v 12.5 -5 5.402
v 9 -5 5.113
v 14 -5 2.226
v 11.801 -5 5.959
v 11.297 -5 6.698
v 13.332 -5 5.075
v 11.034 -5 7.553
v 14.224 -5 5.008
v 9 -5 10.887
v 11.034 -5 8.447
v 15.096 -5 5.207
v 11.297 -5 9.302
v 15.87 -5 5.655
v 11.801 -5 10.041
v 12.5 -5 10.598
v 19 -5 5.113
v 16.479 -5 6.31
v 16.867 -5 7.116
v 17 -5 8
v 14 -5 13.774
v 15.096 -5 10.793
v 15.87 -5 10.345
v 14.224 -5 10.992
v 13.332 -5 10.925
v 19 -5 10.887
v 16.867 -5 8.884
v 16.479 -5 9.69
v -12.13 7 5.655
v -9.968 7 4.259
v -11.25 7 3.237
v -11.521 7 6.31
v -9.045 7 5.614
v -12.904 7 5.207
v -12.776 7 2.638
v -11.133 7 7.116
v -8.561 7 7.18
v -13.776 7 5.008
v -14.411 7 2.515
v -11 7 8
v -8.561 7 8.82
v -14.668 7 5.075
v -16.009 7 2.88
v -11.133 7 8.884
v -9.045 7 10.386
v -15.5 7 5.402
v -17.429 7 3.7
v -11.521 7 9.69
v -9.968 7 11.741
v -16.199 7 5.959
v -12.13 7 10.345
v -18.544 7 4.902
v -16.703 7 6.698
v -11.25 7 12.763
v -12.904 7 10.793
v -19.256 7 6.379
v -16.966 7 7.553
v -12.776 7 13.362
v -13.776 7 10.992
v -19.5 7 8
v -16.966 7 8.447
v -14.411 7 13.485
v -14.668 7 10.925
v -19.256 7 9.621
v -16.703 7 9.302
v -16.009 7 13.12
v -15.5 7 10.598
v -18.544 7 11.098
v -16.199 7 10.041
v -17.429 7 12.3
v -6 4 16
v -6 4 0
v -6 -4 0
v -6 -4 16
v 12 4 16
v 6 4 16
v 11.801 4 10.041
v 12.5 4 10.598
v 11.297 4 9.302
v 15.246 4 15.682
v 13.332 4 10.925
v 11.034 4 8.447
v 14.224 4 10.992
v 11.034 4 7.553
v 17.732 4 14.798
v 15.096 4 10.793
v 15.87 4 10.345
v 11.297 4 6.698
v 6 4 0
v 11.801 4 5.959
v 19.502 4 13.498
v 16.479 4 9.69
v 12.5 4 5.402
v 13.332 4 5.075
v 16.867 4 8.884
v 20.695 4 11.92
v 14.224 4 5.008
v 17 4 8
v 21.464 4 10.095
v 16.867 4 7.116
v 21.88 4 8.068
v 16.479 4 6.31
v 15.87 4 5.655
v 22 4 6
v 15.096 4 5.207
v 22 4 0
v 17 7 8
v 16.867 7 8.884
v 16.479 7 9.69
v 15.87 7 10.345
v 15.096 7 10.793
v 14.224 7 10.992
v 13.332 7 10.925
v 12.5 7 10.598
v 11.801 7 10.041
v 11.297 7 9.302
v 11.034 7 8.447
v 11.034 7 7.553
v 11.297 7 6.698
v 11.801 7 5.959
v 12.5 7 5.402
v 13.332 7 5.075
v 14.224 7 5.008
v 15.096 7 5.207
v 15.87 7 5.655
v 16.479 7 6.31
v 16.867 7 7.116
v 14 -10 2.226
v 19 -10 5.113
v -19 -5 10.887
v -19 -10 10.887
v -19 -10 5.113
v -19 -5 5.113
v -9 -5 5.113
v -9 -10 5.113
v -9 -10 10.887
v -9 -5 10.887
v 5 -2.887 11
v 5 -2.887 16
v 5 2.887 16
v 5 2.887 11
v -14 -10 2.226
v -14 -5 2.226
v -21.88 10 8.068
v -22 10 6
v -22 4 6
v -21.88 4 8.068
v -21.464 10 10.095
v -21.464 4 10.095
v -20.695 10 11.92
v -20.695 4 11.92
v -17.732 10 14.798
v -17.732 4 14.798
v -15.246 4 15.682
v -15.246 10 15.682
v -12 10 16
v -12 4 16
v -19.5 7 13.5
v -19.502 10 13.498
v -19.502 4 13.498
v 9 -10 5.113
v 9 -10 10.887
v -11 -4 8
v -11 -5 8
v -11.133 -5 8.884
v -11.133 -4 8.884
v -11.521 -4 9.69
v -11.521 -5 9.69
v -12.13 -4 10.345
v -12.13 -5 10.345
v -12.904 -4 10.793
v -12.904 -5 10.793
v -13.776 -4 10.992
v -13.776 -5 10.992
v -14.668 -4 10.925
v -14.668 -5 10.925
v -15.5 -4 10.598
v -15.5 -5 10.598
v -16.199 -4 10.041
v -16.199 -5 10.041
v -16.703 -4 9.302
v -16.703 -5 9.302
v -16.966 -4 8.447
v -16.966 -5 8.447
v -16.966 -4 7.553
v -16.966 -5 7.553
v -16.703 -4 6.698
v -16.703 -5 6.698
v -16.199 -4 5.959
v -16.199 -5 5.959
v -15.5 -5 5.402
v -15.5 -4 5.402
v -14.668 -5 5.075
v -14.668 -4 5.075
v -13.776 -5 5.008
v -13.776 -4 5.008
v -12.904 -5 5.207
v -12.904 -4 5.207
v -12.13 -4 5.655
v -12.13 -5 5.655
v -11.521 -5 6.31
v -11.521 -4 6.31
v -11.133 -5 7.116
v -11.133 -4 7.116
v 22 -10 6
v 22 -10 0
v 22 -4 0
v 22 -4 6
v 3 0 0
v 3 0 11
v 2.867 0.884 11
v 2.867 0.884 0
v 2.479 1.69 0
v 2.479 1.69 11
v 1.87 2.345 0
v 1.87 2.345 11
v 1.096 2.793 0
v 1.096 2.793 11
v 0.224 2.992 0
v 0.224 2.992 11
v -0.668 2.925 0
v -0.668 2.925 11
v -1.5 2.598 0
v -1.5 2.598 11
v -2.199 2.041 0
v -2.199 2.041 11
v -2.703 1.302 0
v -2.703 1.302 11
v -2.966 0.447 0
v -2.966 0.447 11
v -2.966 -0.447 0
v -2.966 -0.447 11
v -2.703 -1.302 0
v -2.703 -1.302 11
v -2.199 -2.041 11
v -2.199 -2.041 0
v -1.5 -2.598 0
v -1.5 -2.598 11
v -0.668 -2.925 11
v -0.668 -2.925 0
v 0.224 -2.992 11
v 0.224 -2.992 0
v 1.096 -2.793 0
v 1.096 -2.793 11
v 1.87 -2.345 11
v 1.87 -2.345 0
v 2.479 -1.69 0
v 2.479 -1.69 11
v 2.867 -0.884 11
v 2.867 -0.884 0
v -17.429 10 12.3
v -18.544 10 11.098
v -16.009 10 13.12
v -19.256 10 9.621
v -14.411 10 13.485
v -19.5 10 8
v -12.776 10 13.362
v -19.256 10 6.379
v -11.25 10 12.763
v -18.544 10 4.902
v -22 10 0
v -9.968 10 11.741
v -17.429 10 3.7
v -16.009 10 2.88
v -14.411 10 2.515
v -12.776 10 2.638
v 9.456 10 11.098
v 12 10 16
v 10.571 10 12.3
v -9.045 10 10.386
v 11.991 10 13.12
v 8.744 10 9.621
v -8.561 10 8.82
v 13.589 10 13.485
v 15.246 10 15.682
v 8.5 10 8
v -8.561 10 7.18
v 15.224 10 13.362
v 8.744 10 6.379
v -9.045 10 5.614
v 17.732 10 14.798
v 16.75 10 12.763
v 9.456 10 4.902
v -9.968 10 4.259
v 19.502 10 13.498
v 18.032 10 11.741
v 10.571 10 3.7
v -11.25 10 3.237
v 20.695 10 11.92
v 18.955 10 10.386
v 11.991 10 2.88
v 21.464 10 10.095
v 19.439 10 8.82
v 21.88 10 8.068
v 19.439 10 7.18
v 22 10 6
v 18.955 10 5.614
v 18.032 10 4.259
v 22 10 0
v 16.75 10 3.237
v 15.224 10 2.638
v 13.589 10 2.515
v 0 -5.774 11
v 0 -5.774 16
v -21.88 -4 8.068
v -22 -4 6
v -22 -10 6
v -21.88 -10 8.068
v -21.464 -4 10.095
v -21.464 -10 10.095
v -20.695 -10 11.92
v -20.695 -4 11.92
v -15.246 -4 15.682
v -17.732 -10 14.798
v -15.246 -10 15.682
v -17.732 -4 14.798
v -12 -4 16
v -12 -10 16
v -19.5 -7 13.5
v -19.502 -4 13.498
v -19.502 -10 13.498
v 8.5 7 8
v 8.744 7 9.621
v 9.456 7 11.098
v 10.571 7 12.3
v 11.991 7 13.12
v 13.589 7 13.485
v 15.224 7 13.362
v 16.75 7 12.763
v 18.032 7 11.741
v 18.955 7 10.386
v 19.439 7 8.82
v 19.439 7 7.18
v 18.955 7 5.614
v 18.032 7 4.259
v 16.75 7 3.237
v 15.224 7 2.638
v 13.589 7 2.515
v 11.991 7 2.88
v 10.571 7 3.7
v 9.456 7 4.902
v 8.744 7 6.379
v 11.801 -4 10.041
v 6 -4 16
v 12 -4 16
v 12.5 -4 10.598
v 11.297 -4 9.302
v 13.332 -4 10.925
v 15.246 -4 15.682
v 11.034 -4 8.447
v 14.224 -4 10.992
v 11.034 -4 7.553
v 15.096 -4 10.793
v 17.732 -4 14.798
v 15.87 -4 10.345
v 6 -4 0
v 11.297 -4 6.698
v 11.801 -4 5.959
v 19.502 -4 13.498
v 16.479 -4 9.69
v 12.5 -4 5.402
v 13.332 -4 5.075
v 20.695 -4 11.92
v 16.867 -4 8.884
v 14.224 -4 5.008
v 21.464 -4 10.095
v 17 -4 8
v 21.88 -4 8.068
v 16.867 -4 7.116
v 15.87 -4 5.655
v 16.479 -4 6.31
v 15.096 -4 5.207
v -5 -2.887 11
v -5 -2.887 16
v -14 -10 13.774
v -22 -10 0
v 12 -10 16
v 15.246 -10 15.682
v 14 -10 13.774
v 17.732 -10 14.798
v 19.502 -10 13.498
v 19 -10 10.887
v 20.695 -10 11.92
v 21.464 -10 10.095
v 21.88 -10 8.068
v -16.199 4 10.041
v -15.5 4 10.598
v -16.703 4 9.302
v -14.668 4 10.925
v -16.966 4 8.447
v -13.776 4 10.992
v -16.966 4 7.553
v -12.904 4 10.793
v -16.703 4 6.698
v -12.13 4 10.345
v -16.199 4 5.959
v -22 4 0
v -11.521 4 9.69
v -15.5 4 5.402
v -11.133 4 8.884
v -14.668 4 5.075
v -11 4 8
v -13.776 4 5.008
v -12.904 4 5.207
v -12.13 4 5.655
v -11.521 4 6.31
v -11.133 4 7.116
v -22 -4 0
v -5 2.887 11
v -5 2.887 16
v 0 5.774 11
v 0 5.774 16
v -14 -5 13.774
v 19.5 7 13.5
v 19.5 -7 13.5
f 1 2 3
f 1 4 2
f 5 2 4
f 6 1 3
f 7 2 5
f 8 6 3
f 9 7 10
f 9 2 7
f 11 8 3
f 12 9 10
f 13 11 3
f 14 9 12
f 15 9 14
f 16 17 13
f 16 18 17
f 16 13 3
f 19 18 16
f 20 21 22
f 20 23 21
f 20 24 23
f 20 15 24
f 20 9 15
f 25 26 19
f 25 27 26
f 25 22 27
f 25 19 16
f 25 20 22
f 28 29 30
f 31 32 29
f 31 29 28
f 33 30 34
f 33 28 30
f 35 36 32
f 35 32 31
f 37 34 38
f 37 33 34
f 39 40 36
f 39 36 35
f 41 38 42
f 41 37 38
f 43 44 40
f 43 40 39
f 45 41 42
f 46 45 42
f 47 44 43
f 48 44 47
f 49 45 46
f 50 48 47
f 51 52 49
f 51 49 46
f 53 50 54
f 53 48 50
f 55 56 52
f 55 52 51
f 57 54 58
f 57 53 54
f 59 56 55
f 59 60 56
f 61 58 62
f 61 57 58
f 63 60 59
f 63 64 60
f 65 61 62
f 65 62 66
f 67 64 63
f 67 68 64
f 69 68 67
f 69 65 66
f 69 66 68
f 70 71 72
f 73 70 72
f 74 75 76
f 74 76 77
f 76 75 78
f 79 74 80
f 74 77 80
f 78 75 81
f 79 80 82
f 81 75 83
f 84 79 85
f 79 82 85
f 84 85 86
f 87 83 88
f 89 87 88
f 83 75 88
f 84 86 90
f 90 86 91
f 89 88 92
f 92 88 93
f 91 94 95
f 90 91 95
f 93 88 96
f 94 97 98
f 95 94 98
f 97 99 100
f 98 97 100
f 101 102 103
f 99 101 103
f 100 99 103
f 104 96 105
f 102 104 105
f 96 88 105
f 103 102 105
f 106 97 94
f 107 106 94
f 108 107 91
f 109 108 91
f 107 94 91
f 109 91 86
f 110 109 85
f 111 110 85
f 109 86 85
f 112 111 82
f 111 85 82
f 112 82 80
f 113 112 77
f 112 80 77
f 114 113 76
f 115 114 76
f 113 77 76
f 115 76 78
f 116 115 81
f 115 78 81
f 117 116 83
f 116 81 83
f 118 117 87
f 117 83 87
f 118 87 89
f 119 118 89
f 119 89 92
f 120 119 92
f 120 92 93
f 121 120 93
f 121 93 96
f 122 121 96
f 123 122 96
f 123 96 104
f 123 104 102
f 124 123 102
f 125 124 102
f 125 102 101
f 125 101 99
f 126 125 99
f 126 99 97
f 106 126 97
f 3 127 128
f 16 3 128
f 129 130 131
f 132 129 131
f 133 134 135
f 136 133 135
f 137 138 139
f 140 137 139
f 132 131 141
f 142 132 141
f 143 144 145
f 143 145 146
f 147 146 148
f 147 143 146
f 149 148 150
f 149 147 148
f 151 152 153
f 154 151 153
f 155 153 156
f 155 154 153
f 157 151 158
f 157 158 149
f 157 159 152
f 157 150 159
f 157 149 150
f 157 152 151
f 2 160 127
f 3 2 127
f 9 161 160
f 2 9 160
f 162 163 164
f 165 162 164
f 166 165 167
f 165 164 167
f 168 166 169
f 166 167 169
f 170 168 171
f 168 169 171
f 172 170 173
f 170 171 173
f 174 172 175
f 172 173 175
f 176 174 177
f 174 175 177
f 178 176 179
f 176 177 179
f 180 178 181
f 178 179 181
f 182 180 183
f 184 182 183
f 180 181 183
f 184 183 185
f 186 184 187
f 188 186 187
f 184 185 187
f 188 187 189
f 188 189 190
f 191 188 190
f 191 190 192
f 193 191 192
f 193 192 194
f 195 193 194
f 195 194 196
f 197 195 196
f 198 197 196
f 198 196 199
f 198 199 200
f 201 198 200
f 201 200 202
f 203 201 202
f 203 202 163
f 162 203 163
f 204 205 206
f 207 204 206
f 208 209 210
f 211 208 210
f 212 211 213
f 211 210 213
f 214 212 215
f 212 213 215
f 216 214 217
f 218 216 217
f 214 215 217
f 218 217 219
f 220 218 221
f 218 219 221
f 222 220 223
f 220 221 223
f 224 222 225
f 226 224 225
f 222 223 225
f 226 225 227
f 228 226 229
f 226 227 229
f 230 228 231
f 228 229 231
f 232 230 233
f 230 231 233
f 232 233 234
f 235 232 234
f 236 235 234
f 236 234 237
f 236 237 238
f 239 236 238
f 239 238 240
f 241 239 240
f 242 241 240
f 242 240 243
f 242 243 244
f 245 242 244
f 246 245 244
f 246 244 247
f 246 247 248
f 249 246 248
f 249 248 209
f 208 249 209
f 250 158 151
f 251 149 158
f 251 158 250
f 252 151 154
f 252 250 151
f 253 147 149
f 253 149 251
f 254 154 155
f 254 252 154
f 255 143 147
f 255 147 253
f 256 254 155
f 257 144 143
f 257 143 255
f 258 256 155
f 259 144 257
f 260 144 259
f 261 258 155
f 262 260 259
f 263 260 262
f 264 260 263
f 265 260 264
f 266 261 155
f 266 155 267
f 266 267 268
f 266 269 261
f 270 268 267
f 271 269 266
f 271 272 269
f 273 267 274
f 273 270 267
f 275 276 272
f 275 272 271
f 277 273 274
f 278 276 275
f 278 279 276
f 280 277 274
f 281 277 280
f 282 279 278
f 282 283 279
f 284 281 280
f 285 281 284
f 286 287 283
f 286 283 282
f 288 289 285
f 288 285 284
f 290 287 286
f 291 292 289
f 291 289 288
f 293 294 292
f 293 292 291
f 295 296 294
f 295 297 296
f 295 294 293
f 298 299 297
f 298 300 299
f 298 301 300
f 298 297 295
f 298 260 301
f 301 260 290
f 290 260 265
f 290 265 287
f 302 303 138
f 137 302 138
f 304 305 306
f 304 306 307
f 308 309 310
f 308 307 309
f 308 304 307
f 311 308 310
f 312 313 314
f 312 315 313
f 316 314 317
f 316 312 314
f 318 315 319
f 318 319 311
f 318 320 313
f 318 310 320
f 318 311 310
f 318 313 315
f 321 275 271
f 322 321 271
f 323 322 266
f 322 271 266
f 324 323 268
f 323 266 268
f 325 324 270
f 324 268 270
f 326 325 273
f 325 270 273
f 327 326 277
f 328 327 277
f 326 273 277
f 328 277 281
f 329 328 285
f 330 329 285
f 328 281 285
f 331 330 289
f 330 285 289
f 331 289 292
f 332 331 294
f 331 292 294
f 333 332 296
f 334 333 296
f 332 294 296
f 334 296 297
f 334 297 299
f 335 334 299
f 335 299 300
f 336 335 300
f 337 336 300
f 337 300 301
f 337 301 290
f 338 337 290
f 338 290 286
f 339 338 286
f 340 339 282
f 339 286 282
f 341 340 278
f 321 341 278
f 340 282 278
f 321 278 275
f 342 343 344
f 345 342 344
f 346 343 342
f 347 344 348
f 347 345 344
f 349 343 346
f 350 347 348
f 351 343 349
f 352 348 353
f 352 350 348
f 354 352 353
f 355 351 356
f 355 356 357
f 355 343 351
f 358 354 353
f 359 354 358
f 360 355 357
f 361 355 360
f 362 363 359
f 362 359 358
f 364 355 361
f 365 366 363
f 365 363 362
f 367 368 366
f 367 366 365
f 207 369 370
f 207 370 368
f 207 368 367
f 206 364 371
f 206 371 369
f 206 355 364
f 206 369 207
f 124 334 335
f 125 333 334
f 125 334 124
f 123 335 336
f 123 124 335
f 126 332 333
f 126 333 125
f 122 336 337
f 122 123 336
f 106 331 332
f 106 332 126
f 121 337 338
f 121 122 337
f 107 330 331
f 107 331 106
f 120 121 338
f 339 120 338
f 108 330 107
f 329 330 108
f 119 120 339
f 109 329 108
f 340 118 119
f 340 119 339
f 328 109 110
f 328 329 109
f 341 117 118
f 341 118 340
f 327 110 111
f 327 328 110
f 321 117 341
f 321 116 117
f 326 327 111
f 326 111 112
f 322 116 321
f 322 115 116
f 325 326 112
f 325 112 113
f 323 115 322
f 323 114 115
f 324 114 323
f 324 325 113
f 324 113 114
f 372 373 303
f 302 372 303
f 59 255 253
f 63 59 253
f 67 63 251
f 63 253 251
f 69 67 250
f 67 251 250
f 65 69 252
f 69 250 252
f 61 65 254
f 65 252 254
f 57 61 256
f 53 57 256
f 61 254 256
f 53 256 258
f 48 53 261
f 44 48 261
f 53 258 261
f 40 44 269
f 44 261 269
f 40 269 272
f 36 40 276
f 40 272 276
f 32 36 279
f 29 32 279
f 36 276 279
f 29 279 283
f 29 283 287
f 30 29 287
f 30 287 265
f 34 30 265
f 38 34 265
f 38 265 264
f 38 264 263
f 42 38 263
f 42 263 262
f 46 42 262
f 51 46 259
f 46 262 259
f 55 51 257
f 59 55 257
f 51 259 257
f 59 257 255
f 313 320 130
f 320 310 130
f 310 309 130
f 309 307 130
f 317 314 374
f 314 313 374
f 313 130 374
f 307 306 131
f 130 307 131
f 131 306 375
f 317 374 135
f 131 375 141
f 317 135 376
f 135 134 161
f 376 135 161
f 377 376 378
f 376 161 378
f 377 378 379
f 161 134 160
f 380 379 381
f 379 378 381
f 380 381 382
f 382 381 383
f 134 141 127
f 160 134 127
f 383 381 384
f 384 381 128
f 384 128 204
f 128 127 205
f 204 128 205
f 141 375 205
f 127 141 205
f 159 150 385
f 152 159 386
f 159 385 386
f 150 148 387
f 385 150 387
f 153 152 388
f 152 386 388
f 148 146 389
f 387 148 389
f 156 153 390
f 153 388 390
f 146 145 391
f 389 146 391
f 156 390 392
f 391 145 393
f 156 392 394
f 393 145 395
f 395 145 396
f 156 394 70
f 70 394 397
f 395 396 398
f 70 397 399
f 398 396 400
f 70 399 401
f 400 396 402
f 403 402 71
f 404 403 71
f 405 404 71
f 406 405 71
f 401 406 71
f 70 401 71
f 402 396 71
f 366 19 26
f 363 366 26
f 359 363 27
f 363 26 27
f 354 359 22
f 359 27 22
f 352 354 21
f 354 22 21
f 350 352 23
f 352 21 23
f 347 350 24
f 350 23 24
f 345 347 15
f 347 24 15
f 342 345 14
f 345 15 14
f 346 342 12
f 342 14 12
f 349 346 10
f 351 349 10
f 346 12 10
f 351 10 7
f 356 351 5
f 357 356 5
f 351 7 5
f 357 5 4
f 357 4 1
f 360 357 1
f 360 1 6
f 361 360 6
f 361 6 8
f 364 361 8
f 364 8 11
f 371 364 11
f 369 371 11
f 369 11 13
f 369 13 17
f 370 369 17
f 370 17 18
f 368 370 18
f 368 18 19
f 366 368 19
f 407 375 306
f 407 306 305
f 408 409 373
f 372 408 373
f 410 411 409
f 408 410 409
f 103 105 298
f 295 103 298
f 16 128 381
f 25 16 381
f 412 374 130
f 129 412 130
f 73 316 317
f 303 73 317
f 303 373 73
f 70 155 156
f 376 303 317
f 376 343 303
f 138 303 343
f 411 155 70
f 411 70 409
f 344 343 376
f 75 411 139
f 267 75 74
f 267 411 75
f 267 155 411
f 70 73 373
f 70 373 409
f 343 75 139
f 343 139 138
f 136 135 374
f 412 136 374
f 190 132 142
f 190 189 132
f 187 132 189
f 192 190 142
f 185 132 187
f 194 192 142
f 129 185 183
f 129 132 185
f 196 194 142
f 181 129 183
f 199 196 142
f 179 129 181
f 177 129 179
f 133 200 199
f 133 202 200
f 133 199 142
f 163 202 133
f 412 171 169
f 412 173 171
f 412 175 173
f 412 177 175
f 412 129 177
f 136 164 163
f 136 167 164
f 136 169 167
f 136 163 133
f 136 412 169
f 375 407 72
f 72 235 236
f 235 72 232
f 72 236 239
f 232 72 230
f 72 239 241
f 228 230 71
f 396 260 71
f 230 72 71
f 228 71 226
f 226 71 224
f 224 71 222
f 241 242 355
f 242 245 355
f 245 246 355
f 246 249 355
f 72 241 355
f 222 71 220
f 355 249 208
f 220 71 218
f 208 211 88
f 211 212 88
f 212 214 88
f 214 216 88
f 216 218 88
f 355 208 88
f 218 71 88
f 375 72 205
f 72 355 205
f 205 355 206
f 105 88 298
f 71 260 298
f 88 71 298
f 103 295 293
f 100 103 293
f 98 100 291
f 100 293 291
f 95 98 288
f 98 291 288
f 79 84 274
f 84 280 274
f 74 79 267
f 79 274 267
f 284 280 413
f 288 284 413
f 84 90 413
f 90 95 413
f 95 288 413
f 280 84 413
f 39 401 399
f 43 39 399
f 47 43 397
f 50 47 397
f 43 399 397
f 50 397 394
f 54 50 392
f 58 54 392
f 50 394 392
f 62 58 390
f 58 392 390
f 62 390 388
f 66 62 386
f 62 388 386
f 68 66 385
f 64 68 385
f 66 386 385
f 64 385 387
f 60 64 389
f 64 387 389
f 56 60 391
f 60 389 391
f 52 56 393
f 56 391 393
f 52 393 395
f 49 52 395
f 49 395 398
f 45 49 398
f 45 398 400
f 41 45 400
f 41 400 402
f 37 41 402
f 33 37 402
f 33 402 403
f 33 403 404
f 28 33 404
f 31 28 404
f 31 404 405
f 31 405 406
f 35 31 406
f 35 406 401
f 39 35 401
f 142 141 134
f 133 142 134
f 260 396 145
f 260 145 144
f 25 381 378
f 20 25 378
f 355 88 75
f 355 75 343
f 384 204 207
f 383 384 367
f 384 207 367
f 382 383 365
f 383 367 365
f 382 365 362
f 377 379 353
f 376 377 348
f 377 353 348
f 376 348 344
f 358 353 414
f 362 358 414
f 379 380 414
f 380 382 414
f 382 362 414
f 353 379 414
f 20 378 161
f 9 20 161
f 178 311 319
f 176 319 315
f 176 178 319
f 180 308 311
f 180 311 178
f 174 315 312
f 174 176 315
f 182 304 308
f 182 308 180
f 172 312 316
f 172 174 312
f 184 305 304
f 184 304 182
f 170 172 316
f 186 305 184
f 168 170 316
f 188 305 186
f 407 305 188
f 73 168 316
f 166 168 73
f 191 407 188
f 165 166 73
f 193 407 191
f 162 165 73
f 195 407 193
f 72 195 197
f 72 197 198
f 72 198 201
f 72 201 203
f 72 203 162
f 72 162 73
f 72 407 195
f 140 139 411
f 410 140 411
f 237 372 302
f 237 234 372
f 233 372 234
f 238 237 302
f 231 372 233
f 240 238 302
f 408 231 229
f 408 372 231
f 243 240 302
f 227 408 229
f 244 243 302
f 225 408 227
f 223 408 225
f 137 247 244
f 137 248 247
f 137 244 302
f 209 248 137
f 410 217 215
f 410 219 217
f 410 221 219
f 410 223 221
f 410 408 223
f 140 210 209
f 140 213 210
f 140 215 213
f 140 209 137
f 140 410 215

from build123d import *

# Parameters (mm, degrees)
F0_W        = 44
F0_H        = 20
F1_DEPTH    = 16
F2_R        = 3
F3_DEPTH    = 16
F5_DEPTH    = 5
F6_T1_DEPTH = 70
F7_R        = 3
F8_DEPTH    = 20
F10_DEPTH   = 5
F11_R       = 5.5
F12_DEPTH   = 3
F13_W       = 16
F13_H       = 8
F14_DEPTH   = 25


# Not quite as in the source:
# - a fillet or chamfer that OpenCascade refuses, or shapes differently, is made with other operations: its cross-section is extruded or revolved along the edge and cut away or added


with BuildPart() as f1:
    # F0 (on Top) → F1 (new body)
    with BuildSketch(Plane.XY):
        Rectangle(F0_W, F0_H)
    extrude(amount=F1_DEPTH)

    # F2 (on face) → F3 (cut, through all)
    with BuildSketch(Plane.XY.offset(16)):
        Circle(F2_R)
    extrude(amount=-F3_DEPTH, mode=Mode.SUBTRACT)

    # F4 (on face) → F5 (cut)
    with BuildSketch(Plane.XY.offset(16)):
        Polygon((5, -2.8867513459), (5, 2.8867513459), (0, 5.7735026919), (-5, 2.8867513459), (-5, -2.8867513459), (0, -5.7735026919), align=None)
    extrude(amount=-F5_DEPTH, mode=Mode.SUBTRACT)

    # F6: fillet of radius 10 on 2 edges, made by hand

    # F6_s2 → F6_t1 (cut)
    with BuildSketch(Plane.XZ.offset(-35)):
        with BuildLine():
            add(Edge.make_bspline(
                [(22, 6), (22, 16), (12, 16)],
                knots=[0, 0, 0, 1, 1, 1], degree=2, weights=[1, 1, 1]))
            Line((12, 16), (22, 16))
            Line((22, 16), (22, 6))
        make_face()
        with BuildLine():
            add(Edge.make_bspline(
                [(-22, 6), (-22, 16), (-12, 16)],
                knots=[0, 0, 0, 1, 1, 1], degree=2, weights=[1, 1, 1]))
            Line((-12, 16), (-22, 16))
            Line((-22, 16), (-22, 6))
        make_face()
    extrude(amount=F6_T1_DEPTH, mode=Mode.SUBTRACT)

    # F7 (on face) → F8 (cut, through all)
    with BuildSketch(Plane.XZ.offset(10)):
        with Locations((14, 8)):
            Circle(F7_R)
        with Locations((-14, 8)):
            Circle(F7_R)
    extrude(amount=-F8_DEPTH, mode=Mode.SUBTRACT)

    # F9 (on face) → F10 (cut)
    with BuildSketch(Plane.XZ.offset(10)):
        Polygon((9, 10.8867513459), (9, 5.1132486541), (14, 2.2264973081), (19, 5.1132486541), (19, 10.8867513459), (14, 13.7735026919), align=None)
        Polygon((-9, 5.1132486541), (-9, 10.8867513459), (-14, 13.7735026919), (-19, 10.8867513459), (-19, 5.1132486541), (-14, 2.2264973081), align=None)
    extrude(amount=-F10_DEPTH, mode=Mode.SUBTRACT)

    # F11 (on face) → F12 (cut)
    with BuildSketch(Plane(origin=(0, 10, 0), x_dir=(-1, 0, 0), z_dir=(0, 1, 0))):
        with Locations((-14, 8)):
            Circle(F11_R)
        with Locations((14, 8)):
            Circle(F11_R)
    extrude(amount=-F12_DEPTH, mode=Mode.SUBTRACT)

    # F13 (on face) → F14 (cut)
    with BuildSketch(Plane(origin=(0, 0, 0), x_dir=(1, 0, 0), z_dir=(0, 0, -1))):
        with Locations((-14, 0)):
            Rectangle(F13_W, F13_H)
        with Locations((14, 0)):
            Rectangle(F13_W, F13_H)
    extrude(amount=-F14_DEPTH, mode=Mode.SUBTRACT)


solid = f1.part
